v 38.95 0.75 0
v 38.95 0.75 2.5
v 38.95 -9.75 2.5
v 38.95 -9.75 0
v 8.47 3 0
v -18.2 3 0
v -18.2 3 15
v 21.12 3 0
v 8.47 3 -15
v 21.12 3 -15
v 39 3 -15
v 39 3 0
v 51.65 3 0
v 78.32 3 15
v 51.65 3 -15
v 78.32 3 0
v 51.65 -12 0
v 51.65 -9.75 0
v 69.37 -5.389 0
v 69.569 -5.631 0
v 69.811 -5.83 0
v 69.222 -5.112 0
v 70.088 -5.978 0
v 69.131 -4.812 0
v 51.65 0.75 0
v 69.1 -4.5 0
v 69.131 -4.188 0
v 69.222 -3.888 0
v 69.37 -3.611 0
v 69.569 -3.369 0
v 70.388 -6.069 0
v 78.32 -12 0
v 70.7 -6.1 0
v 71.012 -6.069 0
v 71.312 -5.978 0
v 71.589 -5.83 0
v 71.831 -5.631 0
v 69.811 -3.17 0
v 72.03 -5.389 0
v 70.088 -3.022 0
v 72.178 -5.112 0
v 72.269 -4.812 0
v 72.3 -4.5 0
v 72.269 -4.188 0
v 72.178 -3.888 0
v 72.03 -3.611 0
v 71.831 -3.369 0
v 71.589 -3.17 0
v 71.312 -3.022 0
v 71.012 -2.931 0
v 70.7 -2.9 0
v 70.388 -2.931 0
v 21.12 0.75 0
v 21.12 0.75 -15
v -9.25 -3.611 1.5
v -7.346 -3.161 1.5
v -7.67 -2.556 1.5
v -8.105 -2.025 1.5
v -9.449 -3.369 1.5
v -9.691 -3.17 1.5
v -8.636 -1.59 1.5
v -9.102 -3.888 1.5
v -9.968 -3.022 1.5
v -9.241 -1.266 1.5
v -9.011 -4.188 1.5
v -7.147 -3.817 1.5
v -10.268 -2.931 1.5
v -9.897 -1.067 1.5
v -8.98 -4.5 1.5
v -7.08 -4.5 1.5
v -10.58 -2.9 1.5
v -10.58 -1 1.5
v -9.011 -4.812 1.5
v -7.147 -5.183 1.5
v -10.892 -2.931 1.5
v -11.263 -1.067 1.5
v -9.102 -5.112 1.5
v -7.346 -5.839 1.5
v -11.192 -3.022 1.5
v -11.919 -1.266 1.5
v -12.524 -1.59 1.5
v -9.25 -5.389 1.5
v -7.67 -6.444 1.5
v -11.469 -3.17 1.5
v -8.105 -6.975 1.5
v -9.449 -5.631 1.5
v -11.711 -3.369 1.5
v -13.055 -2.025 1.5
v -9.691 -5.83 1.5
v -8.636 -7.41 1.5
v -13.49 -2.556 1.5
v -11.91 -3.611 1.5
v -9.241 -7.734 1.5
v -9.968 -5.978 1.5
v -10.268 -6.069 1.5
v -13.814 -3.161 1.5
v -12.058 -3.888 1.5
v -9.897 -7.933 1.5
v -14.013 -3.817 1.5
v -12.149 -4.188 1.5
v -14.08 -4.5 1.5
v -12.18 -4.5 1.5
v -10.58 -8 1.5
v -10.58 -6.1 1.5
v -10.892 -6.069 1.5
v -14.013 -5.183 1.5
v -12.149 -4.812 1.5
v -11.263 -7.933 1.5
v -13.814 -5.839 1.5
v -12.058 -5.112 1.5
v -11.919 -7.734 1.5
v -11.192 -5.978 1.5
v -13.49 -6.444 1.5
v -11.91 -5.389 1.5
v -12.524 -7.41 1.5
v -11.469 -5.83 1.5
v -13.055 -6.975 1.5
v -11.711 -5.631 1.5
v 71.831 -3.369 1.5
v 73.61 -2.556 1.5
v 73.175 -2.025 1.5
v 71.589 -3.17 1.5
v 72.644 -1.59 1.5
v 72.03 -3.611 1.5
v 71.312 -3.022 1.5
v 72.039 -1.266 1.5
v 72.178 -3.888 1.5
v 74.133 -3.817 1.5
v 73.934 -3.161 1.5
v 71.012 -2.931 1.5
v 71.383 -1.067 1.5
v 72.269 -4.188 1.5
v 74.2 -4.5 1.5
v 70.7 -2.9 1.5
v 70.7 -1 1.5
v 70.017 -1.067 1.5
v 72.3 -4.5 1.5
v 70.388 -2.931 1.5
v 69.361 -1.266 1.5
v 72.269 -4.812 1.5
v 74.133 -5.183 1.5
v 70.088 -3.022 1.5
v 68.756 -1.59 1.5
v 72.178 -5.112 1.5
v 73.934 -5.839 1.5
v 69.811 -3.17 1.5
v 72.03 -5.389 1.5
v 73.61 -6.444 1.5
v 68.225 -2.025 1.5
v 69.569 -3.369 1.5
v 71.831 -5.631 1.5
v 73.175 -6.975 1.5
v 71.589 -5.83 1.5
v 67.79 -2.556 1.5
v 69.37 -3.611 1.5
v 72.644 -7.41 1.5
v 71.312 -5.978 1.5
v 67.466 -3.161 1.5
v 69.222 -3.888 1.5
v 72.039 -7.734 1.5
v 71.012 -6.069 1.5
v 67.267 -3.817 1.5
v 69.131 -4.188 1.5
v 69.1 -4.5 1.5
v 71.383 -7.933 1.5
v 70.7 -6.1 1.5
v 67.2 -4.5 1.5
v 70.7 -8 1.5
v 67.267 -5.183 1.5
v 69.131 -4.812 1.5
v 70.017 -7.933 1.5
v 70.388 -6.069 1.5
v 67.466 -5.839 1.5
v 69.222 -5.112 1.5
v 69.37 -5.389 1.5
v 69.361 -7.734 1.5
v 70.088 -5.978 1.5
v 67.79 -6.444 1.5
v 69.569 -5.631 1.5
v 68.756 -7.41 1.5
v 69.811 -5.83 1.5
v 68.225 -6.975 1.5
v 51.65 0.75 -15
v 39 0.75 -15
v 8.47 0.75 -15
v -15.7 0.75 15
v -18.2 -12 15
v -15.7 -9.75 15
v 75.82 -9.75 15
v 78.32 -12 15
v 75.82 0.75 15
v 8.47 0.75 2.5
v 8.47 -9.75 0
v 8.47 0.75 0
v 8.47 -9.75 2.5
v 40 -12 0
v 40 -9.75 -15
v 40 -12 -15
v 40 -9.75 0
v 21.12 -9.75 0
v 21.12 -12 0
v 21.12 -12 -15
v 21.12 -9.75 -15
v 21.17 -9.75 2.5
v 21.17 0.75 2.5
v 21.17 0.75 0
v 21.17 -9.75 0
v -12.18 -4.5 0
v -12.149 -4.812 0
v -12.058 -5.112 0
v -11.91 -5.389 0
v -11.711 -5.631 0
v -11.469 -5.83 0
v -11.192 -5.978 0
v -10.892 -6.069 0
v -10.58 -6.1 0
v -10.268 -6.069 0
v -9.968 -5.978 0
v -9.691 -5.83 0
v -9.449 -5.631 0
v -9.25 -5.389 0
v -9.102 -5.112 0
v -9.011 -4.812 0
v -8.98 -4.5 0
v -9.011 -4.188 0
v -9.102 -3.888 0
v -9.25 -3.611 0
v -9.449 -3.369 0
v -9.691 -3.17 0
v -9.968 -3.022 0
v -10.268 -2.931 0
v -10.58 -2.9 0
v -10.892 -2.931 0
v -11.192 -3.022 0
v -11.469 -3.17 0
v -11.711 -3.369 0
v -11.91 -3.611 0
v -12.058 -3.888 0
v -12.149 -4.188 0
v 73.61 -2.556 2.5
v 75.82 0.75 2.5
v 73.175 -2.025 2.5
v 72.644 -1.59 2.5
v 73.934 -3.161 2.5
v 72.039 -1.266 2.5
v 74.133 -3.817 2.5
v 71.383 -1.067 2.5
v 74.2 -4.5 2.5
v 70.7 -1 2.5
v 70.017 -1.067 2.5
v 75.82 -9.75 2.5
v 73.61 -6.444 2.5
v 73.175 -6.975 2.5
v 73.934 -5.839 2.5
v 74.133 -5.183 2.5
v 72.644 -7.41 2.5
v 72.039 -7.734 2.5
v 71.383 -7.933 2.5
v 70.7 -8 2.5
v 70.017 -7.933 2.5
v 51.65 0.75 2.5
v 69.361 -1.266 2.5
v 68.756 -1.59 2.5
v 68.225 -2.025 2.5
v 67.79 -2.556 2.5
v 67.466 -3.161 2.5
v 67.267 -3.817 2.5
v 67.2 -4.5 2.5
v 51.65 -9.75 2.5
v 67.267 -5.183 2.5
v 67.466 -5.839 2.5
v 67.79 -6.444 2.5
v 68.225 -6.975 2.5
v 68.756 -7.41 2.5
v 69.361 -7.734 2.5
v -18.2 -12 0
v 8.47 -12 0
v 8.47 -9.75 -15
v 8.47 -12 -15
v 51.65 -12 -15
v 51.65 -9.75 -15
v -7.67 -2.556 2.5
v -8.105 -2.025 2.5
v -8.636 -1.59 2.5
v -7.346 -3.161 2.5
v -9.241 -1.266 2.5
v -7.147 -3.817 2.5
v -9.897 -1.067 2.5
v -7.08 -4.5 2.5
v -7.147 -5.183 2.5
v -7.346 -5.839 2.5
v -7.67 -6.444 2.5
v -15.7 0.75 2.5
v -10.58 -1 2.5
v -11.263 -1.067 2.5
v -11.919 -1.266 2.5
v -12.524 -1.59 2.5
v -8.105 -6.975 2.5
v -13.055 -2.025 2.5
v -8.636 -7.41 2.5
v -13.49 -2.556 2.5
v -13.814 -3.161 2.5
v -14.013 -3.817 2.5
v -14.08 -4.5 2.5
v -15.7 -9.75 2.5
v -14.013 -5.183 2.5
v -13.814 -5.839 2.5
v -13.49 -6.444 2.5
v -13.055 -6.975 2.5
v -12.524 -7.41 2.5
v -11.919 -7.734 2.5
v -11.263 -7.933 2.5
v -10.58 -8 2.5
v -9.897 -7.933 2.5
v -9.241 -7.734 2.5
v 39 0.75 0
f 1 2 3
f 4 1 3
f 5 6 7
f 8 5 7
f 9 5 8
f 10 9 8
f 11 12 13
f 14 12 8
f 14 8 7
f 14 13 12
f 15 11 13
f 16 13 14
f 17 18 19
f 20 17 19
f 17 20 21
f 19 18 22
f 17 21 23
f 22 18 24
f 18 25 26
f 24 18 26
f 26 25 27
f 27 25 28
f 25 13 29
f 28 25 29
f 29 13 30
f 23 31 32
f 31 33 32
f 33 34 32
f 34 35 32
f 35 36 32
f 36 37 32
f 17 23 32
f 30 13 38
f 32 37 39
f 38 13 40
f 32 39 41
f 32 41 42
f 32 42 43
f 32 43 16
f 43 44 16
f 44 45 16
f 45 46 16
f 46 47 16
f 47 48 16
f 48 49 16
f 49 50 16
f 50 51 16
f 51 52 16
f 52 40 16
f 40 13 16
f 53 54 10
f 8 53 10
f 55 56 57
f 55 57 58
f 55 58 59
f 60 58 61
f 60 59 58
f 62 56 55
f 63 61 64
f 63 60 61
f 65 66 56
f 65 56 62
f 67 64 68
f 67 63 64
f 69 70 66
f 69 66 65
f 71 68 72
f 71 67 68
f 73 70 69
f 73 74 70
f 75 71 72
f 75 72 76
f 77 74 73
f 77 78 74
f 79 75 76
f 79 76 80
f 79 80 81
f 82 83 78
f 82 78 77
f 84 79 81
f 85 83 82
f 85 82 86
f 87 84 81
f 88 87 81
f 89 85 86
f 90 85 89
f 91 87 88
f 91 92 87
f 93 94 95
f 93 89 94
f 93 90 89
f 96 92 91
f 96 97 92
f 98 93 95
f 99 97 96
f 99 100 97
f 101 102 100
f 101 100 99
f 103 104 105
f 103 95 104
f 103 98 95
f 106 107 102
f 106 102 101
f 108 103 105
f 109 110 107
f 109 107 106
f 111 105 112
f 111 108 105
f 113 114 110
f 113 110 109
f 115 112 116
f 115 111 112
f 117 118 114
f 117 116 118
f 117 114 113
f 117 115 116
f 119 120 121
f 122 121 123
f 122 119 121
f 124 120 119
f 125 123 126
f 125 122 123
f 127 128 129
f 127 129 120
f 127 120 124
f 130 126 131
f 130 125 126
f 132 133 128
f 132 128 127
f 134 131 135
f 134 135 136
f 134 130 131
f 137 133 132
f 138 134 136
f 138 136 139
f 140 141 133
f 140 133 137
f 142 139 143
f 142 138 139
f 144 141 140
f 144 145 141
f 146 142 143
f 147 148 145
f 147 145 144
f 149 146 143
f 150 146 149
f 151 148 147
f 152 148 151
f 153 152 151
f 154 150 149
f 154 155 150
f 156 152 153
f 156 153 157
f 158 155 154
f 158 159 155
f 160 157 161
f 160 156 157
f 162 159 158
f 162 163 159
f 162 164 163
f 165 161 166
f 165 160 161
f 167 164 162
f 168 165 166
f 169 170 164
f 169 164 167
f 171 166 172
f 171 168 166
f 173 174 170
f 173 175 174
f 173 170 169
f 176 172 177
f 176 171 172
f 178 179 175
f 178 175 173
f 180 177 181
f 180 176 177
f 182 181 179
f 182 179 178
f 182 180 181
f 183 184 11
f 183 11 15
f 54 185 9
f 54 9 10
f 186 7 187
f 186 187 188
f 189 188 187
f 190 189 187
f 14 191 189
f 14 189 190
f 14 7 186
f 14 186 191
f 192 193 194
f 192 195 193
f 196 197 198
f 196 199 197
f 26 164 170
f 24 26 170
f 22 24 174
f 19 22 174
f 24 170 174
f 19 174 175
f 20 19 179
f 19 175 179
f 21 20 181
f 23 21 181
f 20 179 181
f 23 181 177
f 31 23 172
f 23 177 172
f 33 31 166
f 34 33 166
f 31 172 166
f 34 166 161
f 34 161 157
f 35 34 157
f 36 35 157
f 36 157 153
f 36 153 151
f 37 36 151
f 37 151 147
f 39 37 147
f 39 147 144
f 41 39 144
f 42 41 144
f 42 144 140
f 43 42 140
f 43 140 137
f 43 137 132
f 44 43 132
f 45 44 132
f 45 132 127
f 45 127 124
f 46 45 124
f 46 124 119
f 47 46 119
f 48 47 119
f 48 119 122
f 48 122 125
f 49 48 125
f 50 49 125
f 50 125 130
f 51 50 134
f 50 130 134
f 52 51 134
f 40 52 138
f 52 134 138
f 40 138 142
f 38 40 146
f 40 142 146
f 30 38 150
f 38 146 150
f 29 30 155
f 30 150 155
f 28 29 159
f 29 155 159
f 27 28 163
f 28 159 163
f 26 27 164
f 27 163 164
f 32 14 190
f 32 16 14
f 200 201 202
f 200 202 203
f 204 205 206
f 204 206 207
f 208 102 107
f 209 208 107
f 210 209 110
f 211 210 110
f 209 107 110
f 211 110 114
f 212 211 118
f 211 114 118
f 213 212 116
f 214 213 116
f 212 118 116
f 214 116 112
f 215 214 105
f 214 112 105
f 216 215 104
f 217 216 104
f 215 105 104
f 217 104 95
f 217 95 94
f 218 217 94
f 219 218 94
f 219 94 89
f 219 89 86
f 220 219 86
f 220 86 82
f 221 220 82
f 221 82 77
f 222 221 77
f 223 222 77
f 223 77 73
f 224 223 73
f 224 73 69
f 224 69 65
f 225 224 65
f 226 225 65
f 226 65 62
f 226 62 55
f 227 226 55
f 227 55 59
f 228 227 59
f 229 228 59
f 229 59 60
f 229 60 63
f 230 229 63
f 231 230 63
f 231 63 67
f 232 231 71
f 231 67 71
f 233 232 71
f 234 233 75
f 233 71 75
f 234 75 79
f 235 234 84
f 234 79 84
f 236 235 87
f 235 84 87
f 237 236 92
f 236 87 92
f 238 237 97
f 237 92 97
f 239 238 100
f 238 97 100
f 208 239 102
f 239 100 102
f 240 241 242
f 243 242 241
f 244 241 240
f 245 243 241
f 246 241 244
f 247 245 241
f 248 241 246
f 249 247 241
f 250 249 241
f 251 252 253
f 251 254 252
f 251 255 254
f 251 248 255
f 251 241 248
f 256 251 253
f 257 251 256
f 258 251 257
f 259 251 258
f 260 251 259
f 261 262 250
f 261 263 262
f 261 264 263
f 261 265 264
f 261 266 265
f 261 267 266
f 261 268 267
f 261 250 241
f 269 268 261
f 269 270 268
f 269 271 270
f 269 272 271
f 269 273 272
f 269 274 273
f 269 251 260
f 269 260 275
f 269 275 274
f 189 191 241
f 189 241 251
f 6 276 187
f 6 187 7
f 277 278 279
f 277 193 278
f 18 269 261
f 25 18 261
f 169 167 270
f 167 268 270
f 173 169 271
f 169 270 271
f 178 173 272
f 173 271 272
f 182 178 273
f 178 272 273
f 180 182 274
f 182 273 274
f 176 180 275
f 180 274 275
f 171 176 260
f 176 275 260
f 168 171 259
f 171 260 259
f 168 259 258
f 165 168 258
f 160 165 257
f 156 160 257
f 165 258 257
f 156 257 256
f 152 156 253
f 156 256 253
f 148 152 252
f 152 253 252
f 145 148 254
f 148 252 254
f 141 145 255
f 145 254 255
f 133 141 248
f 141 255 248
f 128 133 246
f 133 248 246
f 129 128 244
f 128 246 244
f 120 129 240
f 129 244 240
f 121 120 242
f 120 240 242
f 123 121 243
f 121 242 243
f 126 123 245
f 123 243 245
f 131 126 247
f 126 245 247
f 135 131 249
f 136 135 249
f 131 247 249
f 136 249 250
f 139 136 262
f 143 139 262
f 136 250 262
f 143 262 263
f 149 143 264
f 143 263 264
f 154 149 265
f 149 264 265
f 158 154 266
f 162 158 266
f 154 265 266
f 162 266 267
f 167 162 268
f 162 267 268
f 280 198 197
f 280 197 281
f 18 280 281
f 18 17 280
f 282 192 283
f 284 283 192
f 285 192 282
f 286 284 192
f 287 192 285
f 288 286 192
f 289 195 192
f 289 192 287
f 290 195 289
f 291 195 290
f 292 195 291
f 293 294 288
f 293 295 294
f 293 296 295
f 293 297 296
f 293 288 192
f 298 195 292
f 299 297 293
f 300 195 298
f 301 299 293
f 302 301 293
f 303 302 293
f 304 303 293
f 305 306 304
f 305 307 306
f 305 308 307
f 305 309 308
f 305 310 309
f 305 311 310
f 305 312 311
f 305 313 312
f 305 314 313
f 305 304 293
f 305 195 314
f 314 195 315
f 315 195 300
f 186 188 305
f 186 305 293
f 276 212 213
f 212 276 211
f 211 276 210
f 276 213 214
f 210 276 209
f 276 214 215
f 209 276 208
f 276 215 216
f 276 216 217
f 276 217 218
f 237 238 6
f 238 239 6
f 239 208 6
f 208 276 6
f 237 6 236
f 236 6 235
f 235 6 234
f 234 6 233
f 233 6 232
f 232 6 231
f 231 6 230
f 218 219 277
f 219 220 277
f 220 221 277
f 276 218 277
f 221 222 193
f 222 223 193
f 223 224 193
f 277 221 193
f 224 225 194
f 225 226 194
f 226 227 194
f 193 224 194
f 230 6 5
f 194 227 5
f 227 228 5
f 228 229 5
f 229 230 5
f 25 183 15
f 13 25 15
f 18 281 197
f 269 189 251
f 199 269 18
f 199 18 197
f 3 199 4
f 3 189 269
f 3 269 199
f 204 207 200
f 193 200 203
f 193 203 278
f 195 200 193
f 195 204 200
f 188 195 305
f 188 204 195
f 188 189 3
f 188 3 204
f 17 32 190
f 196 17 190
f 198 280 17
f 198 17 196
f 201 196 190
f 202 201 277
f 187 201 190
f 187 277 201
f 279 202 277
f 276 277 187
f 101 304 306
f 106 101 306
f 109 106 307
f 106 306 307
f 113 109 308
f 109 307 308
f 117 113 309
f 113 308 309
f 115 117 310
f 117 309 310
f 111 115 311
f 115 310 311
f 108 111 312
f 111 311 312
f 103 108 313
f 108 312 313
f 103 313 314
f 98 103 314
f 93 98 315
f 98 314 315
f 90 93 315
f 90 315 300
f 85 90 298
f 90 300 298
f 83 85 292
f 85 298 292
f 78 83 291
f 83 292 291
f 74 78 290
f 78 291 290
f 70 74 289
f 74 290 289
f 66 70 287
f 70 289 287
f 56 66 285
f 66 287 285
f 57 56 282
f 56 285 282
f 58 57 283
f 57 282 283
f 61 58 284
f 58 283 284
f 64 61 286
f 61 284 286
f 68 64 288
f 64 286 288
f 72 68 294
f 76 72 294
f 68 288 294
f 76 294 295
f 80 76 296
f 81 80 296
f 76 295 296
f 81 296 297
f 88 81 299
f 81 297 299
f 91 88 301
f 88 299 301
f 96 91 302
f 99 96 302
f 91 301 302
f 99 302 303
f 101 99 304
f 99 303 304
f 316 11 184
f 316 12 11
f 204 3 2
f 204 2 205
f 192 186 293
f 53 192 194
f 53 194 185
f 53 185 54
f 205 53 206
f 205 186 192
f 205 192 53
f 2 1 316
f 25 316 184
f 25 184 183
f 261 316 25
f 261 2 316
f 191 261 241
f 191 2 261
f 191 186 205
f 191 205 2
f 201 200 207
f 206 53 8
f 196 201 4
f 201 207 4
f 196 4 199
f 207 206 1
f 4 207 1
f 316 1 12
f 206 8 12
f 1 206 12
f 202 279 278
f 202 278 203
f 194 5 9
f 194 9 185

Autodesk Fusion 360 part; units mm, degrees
sketch "Sketch1" plane through (0, 0, 0) normal (0, 0, 1) x (1, 0, 0)
  line L0 (-18.2, 3) -> (78.32, 3)
  line L1 (78.32, 3) -> (78.32, -12)
  line L2 (78.32, -12) -> (-18.2, -12)
  line L3 (-18.2, -12) -> (-18.2, 3)
  line L4 (-18.2, 3) -> (8.47, 3)
  line L5 (8.47, 3) -> (8.47, 0.5)
  line L6 (8.47, 0.5) -> (21.12, 0.5)
  line L7 (21.12, 0.5) -> (21.12, 3)
  line L8 (78.32, 3) -> (51.65, 3)
  line L9 (51.65, 3) -> (39, 3)
  line L10 (39, 3) -> (39, 0.5)
  line L11 (39, 0.5) -> (51.65, 0.5)
  line L12 (51.65, 0.5) -> (51.65, 3)
  line L13 (8.47, -12) -> (21.12, -12)
  line L14 (8.47, -12) -> (8.47, -9.5)
  line L15 (8.47, -9.5) -> (21.12, -9.5)
  line L16 (21.12, -9.5) -> (21.12, -12)
  line L17 (51.65, -12) -> (39, -12)
  line L18 (40, -12) -> (40, -9.5)
  line L19 (51.65, -12) -> (51.65, -9.5)
  line L20 (40, -9.5) -> (51.65, -9.5)
  dimension "d1" = 96.52
  dimension "d2" = 15
  dimension "d3" = 26.67
  dimension "d4" = 2.5
  dimension "d5" = 12.65
  dimension "d6" = 26.67
  dimension "d7" = 12.65
  dimension "d8" = 12.65
  dimension "d9" = 2.5
  dimension "d10" = 12.65
  dimension "d11" = 2.5
  dimension "d12" = 2.5
extrude "Extrude1" add sketch "Sketch1" along normal blind 15 contours L0 L1 L2 L3 L4 L5 L6 L7 L8 L10 L11 L12 L14 L15 L16 L17 L18 L19 L20 makes body 1
sketch "Sketch2" plane through (0, 0, 0) normal (0, 0, -1) x (1, 0, 0)
  line L0 (40, 9.5) -> (40, 12)
  line L1 (40, 12) -> (21.12, 12)
  line L2 (21.12, 12) -> (21.12, 9.5)
  line L3 (21.12, 9.5) -> (8.47, 9.5)
  line L4 (8.47, 9.5) -> (8.47, 12)
  line L5 (8.47, 12) -> (-18.2, 12)
  line L6 (-18.2, 12) -> (-18.2, -3)
  line L7 (-18.2, -3) -> (8.47, -3)
  line L8 (8.47, -3) -> (8.47, -0.5)
  line L9 (8.47, -0.5) -> (21.12, -0.5)
  line L10 (21.12, -0.5) -> (21.12, -3)
  line L11 (21.12, -3) -> (39, -3)
  line L12 (39, -3) -> (39, -0.5)
  line L13 (39, -0.5) -> (51.65, -0.5)
  line L14 (51.65, -0.5) -> (51.65, -3)
  line L15 (51.65, -3) -> (78.32, -3)
  line L16 (78.32, -3) -> (78.32, 12)
  line L17 (78.32, 12) -> (51.65, 12)
  line L18 (51.65, 12) -> (51.65, 9.5)
  line L19 (51.65, 9.5) -> (40, 9.5)
  line L20 (8.47, 12) -> (21.12, 12)
  line L21 (21.12, 12) -> (21.12, 9.5)
  line L22 (21.12, 9.5) -> (8.47, 9.5)
  line L23 (8.47, 9.5) -> (8.47, 12)
  line L24 (8.47, -0.5) -> (21.12, -0.5)
  line L25 (21.12, -0.5) -> (21.12, -3)
  line L26 (21.12, -3) -> (8.47, -3)
  line L27 (8.47, -3) -> (8.47, -0.5)
  line L28 (40, 12) -> (51.65, 12)
  line L29 (51.65, 12) -> (51.65, 9.5)
  line L30 (51.65, 9.5) -> (40, 9.5)
  line L31 (40, 9.5) -> (40, 12)
  line L32 (39, -0.5) -> (51.65, -0.5)
  line L33 (51.65, -0.5) -> (51.65, -3)
  line L34 (51.65, -3) -> (39, -3)
  line L35 (39, -3) -> (39, -0.5)
extrude "Extrude2" add sketch "Sketch2" along normal blind 15 separate body contours L0 L18 L19 L28 L29 L30 L31 | L2 L3 L4 L20 L21 L22 L23 | L12 L13 L14 L32 L33 L34 L35 | L8 L9 L10 L24 L25 L26 L27 makes body 2 at (47.7667, -9.5, -5) makes body 3 at (47.4333, 3, -5) makes body 4 at (16.9033, -9.5, -5) makes body 5 at (12.6867, 0.5, -5)
extrude "Extrude3" add 4 faces at (43.2167, 1.3333, 0) (12.6867, 1.3333, 0) (16.9033, -11.1667, 0) (47.7667, -10.3333, 0) along direction (0, 0, 1) blind 15 on bodies 2 3 4 5 bodies 1 3 2 4 5
sketch "Sketch3" plane through (0, 0, 15) normal (0, 0, 1) x (-1, 0, 0)
  line L0 (18.2, 12) -> (-78.32, 12)
  line L1 (-78.32, 12) -> (-78.32, -3)
  line L2 (-78.32, -3) -> (18.2, -3)
  line L3 (18.2, -3) -> (18.2, 12)
  line L4 (-75.82, 9.75) -> (15.7, 9.75)
  line L5 (15.7, 9.75) -> (15.7, -0.75)
  line L6 (15.7, -0.75) -> (-75.82, -0.75)
  line L7 (-75.82, -0.75) -> (-75.82, 9.75)
  line L8 (-78.32, 12) -> (-75.82, 12)
  line L9 (-75.82, 12) -> (-75.82, 9.75)
  dimension "d19" = 91.52
  dimension "d20" = 10.5
  dimension "d21" = 2.5
  dimension "d22" = 2.25
extrude "Extrude4" cut sketch "Sketch3" against normal blind 12.5 contours L4 L5 L6 L7 bodies 1
sketch "Sketch4" plane through (0, 0, 2.5) normal (0, 0, 1) x (-1, 0, 0)
  line L0 (-75.82, -0.75) -> (15.7, -0.75)
  line L1 (15.7, -0.75) -> (15.7, 9.75)
  line L2 (15.7, 9.75) -> (-75.82, 9.75)
  line L3 (-75.82, 9.75) -> (-75.82, -0.75)
  line L4 (-75.82, 4.5) -> (-70.7, 4.5)
  circle A0 centre (-70.7, 4.5) radius 1.6
  line L5 (15.7, 4.5) -> (10.58, 4.5)
  circle A1 centre (10.58, 4.5) radius 1.6
  dimension "d25" = 5.12
  dimension "d26" = 3.2
  dimension "d27" = 5.12
  dimension "d28" = 3.2
extrude "Extrude5" cut sketch "Sketch4" against normal blind 100 contours A1 | A0 bodies 1
sketch "Sketch5" plane through (0, 0, 2.5) normal (0, 0, 1) x (-1, 0, 0)
  circle A0 centre (10.58, 4.5) radius 1.6
  circle A1 centre (-70.7, 4.5) radius 1.6
  line L0 (-75.82, -0.75) -> (15.7, -0.75)
  line L1 (15.7, -0.75) -> (15.7, 9.75)
  line L2 (15.7, 9.75) -> (-75.82, 9.75)
  line L3 (-75.82, 9.75) -> (-75.82, -0.75)
  circle A2 centre (10.58, 4.5) radius 3.5
  circle A3 centre (-70.7, 4.5) radius 3.5
  dimension "d31" = 7
  dimension "d32" = 7
extrude "Extrude6" cut sketch "Sketch5" against normal blind 1 contours A2 | A3 bodies 1
sketch "Sketch6" plane through (0, 0, 2.5) normal (0, 0, 1) x (-1, 0, 0)
  circle A0 centre (-70.7, 4.5) radius 3.5
  circle A1 centre (10.58, 4.5) radius 3.5
  line L0 (-75.82, -0.75) -> (15.7, -0.75)
  line L1 (15.7, -0.75) -> (15.7, 9.75)
  line L2 (15.7, 9.75) -> (-75.82, 9.75)
  line L3 (-75.82, 9.75) -> (-75.82, -0.75)
  line L4 (-75.82, 4.5) -> (-78.3, 4.5)
  line L5 (-75.82, 4.5) -> (-51.65, 4.5)
  line L6 (-51.65, 4.5) -> (-38.95, 4.5)
  line L7 (15.7, 4.5) -> (-8.47, 4.5)
  line L8 (-8.47, 4.5) -> (-21.17, 4.5)
  line L9 (-38.95, 9.75) -> (-51.65, 9.75)
  line L10 (-51.65, 9.75) -> (-51.65, -0.75)
  line L11 (-51.65, -0.75) -> (-38.95, -0.75)
  line L12 (-38.95, -0.75) -> (-38.95, 9.75)
  line L13 (-8.47, -0.75) -> (-21.17, -0.75)
  line L14 (-21.17, -0.75) -> (-21.17, 9.75)
  line L15 (-21.17, 9.75) -> (-8.47, 9.75)
  line L16 (-8.47, 9.75) -> (-8.47, -0.75)
  dimension "d35" = 24.17
  dimension "d36" = 12.7
  dimension "d37" = 24.17
  dimension "d38" = 12.7
extrude "Extrude7" cut sketch "Sketch6" against normal blind 100 contours L2 L6 L9 L10 L12 | L0 L6 L10 L11 L12 | L0 L8 L13 L14 L16 | L2 L8 L14 L15 L16 bodies 1
